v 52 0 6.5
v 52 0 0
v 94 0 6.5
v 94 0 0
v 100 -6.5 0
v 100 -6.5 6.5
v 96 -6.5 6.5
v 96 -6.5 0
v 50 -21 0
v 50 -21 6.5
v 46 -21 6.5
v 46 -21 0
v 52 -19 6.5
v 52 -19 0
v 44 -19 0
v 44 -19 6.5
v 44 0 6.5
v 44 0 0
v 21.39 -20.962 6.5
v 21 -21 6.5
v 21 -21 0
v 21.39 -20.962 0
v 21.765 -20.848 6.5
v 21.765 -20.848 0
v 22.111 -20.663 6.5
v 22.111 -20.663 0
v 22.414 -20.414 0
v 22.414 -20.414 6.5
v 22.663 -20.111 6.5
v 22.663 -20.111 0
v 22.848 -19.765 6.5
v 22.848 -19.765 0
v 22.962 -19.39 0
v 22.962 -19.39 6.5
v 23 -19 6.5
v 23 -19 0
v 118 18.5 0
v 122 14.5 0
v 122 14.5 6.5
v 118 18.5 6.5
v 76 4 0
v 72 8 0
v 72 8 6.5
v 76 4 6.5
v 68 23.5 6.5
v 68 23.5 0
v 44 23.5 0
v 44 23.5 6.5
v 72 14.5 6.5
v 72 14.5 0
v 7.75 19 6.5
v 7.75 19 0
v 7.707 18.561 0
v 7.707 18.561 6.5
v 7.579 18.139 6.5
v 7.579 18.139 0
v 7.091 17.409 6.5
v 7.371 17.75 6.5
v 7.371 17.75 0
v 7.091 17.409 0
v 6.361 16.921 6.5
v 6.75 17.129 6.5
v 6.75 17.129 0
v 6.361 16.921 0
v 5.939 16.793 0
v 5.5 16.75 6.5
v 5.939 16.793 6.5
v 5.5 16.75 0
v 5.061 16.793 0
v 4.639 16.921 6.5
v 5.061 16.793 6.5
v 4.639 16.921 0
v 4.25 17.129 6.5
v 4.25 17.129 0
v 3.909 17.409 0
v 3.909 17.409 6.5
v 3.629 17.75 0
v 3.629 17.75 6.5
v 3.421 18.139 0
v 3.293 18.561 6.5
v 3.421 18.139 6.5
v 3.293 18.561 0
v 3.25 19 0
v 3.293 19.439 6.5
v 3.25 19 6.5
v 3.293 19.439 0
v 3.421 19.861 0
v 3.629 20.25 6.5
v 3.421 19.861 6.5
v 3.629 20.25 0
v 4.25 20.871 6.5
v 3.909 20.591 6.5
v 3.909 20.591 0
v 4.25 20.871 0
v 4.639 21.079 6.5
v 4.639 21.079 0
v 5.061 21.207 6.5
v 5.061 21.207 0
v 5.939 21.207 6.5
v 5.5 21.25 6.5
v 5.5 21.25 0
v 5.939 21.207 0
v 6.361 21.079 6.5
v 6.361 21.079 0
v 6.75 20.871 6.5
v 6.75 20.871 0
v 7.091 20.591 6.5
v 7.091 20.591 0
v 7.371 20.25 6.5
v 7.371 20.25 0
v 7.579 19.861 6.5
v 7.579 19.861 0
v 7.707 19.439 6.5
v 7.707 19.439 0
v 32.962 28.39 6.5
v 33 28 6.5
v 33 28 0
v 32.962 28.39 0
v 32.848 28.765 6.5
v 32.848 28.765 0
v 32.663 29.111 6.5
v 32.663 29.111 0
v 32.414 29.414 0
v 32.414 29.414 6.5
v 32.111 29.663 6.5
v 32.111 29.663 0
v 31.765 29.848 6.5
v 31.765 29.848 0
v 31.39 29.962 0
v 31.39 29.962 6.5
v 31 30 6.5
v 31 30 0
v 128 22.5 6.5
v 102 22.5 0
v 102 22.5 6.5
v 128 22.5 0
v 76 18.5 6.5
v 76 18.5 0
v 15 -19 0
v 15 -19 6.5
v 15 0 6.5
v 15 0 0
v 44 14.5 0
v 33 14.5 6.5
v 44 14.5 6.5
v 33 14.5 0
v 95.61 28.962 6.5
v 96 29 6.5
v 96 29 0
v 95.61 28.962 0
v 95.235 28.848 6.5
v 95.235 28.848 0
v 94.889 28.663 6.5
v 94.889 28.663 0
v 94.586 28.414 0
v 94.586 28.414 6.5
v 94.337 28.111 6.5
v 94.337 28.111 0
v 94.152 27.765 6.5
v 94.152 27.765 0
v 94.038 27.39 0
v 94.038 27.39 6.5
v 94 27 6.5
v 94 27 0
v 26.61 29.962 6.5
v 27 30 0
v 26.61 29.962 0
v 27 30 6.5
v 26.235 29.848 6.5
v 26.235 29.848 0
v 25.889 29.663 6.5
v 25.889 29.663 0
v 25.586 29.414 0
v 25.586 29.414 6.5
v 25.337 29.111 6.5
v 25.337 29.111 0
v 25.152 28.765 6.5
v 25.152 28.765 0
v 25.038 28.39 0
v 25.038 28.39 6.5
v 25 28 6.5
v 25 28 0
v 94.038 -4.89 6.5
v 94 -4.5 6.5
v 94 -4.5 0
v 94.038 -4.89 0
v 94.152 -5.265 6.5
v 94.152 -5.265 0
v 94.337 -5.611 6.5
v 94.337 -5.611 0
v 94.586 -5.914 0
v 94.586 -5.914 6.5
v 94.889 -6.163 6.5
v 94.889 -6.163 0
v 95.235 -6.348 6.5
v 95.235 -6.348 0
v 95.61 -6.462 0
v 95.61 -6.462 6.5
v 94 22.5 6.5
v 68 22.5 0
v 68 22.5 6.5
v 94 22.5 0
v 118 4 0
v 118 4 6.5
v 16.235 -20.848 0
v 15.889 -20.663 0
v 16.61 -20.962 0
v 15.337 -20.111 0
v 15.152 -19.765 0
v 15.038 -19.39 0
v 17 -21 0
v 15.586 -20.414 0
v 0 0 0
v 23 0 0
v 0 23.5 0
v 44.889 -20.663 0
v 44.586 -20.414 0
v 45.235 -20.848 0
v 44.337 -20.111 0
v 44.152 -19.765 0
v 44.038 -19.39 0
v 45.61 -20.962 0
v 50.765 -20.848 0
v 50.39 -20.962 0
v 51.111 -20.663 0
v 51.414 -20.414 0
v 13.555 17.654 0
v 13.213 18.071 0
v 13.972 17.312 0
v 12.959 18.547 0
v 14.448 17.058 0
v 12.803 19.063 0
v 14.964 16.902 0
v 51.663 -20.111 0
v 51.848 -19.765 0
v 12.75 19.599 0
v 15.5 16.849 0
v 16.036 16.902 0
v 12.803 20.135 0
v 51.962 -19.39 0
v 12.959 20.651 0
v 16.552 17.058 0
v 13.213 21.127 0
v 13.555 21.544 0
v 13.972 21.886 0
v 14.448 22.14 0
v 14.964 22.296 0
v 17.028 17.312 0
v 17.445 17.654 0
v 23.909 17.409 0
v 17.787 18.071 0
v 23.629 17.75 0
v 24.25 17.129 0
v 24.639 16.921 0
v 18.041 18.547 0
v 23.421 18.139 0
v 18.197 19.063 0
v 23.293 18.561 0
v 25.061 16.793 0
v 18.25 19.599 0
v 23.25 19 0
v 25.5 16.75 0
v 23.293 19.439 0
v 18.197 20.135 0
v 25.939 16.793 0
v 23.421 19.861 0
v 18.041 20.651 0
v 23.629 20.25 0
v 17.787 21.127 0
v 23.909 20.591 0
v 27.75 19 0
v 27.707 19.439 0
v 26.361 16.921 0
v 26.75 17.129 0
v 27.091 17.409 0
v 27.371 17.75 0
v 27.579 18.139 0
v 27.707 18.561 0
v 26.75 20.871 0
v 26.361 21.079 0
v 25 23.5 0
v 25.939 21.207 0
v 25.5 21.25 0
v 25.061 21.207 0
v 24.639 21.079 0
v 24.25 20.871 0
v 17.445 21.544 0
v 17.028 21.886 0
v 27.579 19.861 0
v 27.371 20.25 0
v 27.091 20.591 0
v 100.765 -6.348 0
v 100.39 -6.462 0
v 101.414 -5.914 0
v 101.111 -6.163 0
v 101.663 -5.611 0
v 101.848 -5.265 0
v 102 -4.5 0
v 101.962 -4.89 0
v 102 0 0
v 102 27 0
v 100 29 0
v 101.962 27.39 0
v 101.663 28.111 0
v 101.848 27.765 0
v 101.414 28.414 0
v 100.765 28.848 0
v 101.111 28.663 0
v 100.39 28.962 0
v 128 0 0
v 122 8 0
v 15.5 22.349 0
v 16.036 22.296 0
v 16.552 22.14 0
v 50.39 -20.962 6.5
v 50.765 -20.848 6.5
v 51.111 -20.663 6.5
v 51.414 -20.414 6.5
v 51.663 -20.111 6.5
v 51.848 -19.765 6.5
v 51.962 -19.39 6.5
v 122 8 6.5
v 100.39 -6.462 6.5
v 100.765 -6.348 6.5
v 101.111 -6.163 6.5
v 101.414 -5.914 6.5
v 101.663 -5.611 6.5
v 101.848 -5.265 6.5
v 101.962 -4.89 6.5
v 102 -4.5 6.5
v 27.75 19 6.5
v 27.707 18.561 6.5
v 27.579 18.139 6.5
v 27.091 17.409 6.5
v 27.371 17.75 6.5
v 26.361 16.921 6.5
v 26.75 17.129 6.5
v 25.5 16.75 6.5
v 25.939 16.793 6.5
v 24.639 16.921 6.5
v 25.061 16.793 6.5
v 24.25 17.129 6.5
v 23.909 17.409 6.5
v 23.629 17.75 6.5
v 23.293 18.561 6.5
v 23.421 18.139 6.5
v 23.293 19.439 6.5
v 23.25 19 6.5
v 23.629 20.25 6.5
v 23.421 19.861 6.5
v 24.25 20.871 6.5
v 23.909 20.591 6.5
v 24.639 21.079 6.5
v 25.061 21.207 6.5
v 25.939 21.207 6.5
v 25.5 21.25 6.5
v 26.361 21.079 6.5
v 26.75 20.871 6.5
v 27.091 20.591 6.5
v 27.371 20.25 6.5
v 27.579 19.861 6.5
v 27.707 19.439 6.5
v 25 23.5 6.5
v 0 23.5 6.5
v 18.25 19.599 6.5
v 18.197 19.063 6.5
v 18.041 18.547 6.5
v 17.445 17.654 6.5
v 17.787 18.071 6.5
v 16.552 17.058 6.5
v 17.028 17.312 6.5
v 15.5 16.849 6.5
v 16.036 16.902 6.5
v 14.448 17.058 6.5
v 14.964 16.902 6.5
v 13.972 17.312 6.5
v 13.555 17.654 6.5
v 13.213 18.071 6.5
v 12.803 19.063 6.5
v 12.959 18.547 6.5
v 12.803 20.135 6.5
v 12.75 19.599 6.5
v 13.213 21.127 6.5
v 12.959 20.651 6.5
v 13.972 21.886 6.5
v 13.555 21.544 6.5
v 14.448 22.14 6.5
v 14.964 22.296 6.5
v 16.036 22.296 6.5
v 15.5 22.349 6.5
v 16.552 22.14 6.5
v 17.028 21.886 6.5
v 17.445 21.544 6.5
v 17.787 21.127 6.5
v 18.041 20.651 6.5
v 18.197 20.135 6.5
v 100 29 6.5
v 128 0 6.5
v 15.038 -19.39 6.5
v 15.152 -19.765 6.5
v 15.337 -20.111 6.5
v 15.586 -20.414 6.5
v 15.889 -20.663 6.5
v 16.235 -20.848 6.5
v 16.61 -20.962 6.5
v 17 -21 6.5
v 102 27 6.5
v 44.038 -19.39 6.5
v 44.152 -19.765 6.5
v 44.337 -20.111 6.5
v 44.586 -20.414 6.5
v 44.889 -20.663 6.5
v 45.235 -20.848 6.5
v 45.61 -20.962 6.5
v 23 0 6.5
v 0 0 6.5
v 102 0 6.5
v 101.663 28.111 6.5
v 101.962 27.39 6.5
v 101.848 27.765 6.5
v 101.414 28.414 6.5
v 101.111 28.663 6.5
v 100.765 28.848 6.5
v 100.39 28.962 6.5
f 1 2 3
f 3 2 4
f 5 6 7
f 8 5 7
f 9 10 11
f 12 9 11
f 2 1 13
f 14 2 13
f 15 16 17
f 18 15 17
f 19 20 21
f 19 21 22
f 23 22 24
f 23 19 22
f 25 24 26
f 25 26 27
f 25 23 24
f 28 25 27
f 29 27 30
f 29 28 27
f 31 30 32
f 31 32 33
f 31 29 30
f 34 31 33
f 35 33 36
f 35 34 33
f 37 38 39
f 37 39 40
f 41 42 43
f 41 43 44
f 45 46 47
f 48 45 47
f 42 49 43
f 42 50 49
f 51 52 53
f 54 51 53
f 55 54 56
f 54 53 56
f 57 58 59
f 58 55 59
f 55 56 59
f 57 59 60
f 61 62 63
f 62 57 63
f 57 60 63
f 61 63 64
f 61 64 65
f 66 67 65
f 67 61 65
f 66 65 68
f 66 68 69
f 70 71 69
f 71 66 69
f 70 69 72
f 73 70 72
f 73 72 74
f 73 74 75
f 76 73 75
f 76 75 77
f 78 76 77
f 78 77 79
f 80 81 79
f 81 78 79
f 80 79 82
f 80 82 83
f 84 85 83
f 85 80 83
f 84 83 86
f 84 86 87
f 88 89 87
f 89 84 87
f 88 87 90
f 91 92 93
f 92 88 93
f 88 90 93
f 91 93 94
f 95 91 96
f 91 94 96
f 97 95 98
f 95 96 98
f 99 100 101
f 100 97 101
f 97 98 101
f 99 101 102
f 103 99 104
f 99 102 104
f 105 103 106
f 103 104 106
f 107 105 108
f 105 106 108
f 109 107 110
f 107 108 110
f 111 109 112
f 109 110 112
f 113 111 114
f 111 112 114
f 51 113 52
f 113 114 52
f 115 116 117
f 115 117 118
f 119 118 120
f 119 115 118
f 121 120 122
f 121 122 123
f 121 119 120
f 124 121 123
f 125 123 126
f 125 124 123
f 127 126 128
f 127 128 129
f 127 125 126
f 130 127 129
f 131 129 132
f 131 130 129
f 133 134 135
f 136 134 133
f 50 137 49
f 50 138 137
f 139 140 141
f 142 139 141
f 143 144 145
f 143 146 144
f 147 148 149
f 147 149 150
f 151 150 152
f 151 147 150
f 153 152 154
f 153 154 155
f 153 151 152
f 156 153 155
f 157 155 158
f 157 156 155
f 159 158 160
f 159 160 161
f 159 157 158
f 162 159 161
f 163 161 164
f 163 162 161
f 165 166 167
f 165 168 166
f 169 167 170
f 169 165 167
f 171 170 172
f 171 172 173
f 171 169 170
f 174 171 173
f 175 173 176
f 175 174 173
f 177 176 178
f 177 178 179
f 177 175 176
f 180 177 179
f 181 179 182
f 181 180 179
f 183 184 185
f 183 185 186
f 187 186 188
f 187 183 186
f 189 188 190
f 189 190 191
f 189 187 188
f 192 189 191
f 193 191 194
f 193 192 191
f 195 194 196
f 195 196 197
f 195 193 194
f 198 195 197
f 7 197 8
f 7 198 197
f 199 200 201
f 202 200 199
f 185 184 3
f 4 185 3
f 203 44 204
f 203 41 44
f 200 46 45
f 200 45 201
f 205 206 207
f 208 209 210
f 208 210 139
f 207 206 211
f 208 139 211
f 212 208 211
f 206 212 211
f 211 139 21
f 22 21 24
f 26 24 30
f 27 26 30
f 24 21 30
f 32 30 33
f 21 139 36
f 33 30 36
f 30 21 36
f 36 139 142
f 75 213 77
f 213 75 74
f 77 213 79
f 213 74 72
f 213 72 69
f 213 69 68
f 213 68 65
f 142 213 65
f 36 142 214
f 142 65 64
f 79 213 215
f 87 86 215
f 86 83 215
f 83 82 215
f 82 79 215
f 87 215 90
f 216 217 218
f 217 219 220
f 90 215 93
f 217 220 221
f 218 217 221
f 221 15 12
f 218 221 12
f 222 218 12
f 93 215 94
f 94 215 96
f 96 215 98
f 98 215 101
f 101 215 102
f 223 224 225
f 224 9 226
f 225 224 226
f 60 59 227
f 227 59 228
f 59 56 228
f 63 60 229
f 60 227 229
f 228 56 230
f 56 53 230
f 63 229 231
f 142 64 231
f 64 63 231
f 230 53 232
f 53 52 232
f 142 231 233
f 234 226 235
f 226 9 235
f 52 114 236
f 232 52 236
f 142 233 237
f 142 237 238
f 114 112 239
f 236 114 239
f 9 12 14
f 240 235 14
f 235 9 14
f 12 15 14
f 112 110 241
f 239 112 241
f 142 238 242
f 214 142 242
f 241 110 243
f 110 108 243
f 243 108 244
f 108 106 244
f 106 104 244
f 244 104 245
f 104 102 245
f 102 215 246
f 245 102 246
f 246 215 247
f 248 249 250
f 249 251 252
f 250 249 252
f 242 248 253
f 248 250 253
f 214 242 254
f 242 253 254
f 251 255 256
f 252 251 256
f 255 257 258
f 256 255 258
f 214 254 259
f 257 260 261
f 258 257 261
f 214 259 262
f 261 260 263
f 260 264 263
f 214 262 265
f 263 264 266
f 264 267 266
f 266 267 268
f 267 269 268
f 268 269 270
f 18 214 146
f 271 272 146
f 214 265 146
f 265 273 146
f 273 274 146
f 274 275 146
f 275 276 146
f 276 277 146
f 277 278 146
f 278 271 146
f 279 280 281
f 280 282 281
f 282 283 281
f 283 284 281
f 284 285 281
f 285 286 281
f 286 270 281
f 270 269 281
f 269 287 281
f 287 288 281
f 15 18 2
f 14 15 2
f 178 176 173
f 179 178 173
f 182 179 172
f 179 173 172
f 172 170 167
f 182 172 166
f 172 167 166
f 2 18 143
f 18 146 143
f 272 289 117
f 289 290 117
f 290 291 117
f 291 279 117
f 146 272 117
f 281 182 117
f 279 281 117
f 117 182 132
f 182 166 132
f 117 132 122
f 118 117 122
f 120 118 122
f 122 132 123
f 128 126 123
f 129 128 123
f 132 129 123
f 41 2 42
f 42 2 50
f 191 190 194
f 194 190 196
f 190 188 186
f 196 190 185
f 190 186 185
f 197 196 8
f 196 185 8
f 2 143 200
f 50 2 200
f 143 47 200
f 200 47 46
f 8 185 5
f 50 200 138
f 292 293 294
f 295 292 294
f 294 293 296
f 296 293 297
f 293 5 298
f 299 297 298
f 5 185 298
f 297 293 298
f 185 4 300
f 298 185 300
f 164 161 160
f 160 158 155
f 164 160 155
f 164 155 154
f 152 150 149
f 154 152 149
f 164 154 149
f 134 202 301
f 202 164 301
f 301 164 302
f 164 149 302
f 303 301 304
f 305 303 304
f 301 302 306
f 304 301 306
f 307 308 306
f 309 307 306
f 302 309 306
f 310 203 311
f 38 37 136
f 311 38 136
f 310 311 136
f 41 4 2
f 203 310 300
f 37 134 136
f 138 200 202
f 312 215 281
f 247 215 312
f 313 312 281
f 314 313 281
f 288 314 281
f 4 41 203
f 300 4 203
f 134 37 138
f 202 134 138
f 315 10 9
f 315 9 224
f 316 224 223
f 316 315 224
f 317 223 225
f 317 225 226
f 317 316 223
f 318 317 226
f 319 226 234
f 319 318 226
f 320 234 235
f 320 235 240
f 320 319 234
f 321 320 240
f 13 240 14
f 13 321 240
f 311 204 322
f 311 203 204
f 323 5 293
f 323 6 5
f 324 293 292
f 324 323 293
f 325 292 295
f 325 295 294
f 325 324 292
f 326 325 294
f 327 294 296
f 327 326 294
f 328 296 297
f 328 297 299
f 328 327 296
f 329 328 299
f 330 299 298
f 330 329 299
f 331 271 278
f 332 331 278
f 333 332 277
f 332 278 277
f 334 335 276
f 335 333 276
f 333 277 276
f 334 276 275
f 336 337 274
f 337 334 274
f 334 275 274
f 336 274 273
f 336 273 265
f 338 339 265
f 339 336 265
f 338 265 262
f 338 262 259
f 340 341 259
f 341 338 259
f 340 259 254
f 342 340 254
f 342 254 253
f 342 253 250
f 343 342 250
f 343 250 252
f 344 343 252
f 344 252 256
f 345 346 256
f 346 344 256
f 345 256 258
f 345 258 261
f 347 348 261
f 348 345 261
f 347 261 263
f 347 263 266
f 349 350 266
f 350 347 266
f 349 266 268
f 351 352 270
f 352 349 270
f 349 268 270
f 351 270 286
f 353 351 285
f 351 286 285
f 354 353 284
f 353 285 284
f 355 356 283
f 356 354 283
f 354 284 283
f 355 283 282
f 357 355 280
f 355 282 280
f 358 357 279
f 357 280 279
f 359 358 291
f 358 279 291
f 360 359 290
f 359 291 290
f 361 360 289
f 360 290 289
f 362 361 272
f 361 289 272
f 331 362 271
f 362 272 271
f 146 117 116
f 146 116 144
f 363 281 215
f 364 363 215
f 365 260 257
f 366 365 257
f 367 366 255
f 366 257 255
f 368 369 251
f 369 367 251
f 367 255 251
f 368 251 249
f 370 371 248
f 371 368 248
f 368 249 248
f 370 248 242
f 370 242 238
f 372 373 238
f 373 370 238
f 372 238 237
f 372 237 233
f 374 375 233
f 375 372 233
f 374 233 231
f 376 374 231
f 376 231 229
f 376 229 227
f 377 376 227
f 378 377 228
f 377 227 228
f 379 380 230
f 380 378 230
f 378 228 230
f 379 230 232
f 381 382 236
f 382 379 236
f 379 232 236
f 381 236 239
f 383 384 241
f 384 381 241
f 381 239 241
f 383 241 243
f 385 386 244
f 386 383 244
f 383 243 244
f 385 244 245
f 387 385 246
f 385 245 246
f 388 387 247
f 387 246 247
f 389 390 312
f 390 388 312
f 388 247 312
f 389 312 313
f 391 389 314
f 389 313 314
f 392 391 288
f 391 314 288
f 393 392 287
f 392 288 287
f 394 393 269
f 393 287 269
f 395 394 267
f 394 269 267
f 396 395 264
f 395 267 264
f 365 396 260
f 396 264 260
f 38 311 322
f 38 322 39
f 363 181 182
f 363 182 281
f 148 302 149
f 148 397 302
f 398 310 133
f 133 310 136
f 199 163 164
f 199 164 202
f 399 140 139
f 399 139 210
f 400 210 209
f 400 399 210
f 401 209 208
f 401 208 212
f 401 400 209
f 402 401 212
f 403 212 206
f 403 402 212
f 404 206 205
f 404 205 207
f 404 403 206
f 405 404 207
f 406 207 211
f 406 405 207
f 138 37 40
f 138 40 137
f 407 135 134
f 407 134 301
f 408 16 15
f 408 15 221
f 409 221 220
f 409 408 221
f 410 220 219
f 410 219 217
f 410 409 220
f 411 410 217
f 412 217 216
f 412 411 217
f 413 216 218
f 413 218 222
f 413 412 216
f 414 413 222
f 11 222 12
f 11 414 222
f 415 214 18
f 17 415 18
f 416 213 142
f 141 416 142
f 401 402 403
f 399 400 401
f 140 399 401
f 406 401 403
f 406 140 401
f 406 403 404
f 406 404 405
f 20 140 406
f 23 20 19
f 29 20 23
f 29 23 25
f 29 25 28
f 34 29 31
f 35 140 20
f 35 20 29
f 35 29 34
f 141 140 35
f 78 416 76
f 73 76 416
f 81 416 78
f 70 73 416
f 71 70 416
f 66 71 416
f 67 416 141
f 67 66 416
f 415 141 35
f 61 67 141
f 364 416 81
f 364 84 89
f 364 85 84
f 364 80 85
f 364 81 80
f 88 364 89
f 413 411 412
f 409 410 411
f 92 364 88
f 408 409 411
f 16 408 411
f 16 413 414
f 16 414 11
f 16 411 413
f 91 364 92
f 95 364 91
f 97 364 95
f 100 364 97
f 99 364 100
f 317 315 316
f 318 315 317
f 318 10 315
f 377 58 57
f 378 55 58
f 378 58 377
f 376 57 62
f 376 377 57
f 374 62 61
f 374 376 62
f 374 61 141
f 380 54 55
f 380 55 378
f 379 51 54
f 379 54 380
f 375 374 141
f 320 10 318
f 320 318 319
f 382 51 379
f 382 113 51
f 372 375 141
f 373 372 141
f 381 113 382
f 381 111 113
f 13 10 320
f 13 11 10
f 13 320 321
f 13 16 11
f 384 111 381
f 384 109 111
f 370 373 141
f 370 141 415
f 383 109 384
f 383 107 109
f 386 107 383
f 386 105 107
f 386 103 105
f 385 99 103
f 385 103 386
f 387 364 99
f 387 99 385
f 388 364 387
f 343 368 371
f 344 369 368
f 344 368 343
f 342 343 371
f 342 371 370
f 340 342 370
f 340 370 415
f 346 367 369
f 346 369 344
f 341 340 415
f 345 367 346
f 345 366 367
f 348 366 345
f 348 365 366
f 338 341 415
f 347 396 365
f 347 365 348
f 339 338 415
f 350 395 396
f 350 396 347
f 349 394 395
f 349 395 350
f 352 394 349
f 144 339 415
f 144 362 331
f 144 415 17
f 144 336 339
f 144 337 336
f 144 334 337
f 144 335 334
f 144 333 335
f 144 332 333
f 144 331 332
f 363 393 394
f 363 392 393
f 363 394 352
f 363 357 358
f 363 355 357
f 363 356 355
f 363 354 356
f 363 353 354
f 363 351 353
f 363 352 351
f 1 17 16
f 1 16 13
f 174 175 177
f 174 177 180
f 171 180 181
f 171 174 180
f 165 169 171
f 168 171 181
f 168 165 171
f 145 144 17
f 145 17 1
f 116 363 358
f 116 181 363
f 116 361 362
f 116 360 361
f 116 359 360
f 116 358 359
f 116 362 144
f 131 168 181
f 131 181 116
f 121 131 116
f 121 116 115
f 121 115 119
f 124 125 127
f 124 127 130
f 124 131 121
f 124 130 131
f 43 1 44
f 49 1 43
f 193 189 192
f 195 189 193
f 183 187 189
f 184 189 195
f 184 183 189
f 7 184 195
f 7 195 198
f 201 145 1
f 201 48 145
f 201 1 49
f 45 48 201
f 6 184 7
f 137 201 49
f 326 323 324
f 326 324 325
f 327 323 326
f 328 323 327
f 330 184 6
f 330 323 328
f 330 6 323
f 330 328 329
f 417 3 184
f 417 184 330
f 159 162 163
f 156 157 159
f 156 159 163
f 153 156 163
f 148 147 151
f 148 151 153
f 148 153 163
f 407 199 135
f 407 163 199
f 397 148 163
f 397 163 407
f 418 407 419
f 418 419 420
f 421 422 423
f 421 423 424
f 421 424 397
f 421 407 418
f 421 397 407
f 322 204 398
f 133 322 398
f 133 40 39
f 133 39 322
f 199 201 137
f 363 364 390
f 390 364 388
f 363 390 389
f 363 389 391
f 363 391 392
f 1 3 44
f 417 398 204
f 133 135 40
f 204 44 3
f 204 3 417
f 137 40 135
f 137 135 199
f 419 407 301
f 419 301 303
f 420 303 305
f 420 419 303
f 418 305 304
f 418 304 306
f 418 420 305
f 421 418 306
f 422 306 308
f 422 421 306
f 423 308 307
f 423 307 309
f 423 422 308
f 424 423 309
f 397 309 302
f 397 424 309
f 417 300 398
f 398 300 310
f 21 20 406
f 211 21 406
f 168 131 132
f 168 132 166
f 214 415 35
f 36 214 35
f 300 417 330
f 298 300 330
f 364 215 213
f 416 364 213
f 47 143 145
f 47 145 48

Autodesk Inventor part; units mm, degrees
ref_plane "YZ Plane" through (0, 0, 0) normal (1, 0, 0) x (0, 1, 0)
ref_plane "XZ Plane" through (0, 0, 0) normal (0, 1, 0) x (-1, 0, 0)
ref_plane "XY Plane" through (0, 0, 0) normal (0, 0, 1) x (1, 0, 0)
sketch "Sketch1" plane through (0, 0, 0) normal (0, 0, 1) x (1, 0, 0)
  line L0 (0, 0) -> (128, 0)
  line L1 (128, 0) -> (128, 22.5)
  line L2 (0, 23.5) -> (0, 0)
  line L3 (68, 23.5) -> (68, 22.5)
  line L4 (68, 22.5) -> (128, 22.5)
  line L5 (33, 23.5) -> (33, 14.5)
  line L6 (33, 14.5) -> (44, 14.5)
  line L7 (44, 14.5) -> (44, 23.5)
  line L8 (68, 23.5) -> (44, 23.5)
  line L9 (33, 23.5) -> (0, 23.5)
  line L10 (72, 14.5) -> (72, 8)
  line L11 (72, 8) -> (76, 4)
  line L12 (76, 4) -> (118, 4)
  line L13 (118, 4) -> (122, 8)
  line L14 (122, 8) -> (122, 14.5)
  line L15 (122, 14.5) -> (118, 18.5)
  line L16 (118, 18.5) -> (76, 18.5)
  line L17 (76, 18.5) -> (72, 14.5)
  line L18 (68, 22.5) -> (68, 0) construction
  circle A0 centre (5.5, 19) radius 2.25
  circle A1 centre (25.5, 19) radius 2.25
  circle A2 centre (15.5, 19.599) radius 2.75
  circle A3 centre (38.5, 19.599) radius 7.5 construction
  circle A4 centre (38.5, 19.599) radius 4 construction
  point P0 (33, 19)
  dimension "d0" = 128
  dimension "d1" = 23.5
  dimension "d2" = 22.5
  dimension "d3" = 60
  dimension "d4" = 11
  dimension "d5" = 9
  dimension "d6" = 33
  dimension "d7" = 45
  dimension "d8" = 4
  dimension "d9" = 4
  dimension "d10" = 6
  dimension "d11" = 4
  dimension "d12" = 4
  dimension "d13" = 4.5
  dimension "d14" = 4.5
  dimension "d15" = 5.5
  dimension "d16" = 20
  dimension "d17" = 5.5
  dimension "d18" = 8
  dimension "d19" = 15
  dimension "d20" = 10
extrude "Extrusion1" add sketch "Sketch1" along normal blind 6.5
sketch "Sketch2" plane through (0, 0, 6.5) normal (0, 0, 1) x (1, 0, 0)
  line L0 (0, 0) -> (128, 0) projected
  line L1 (128, 0) -> (128, 22.5) projected
  line L2 (128, 22.5) -> (68, 22.5) projected
  line L3 (33, 23.5) -> (0, 23.5) projected
  line L4 (0, 23.5) -> (0, 0) projected
  line L5 (25, 23.5) -> (33, 23.5)
  line L6 (33, 23.5) -> (33, 28)
  line L7 (31, 30) -> (27, 30)
  line L8 (25, 28) -> (25, 23.5)
  line L9 (94, 22.5) -> (102, 22.5)
  line L10 (102, 22.5) -> (102, 27)
  line L11 (100, 29) -> (96, 29)
  line L12 (94, 27) -> (94, 22.5)
  line L13 (15, 0) -> (23, 0)
  line L14 (23, 0) -> (23, -19)
  line L15 (21, -21) -> (17, -21)
  line L16 (15, -19) -> (15, 0)
  line L17 (44, 0) -> (52, 0)
  line L18 (52, 0) -> (52, -19)
  line L19 (50, -21) -> (46, -21)
  line L20 (44, -19) -> (44, 0)
  line L21 (94, 0) -> (102, 0)
  line L22 (102, 0) -> (102, -4.5)
  line L23 (100, -6.5) -> (96, -6.5)
  line L24 (94, -4.5) -> (94, 0)
  arc A0 (27, 30) -> (25, 28) centre (27, 28) ccw
  arc A1 (33, 28) -> (31, 30) centre (31, 28) ccw
  arc A2 (96, 29) -> (94, 27) centre (96, 27) ccw
  arc A3 (102, 27) -> (100, 29) centre (100, 27) ccw
  arc A4 (15, -19) -> (17, -21) centre (17, -19) ccw
  arc A5 (21, -21) -> (23, -19) centre (21, -19) ccw
  arc A6 (44, -19) -> (46, -21) centre (46, -19) ccw
  arc A7 (50, -21) -> (52, -19) centre (50, -19) ccw
  arc A8 (94, -4.5) -> (96, -6.5) centre (96, -4.5) ccw
  arc A9 (100, -6.5) -> (102, -4.5) centre (100, -4.5) ccw
  line L25 (33, 14.5) -> (33, 23.5) projected
  dimension "d23" = 2
  dimension "d24" = 8
  dimension "d25" = 8
  dimension "d26" = 8
  dimension "d27" = 8
  dimension "d28" = 8
  dimension "d29" = 21
  dimension "d30" = 6.5
  dimension "d31" = 6.5
  dimension "d33" = 26
  dimension "d34" = 15
  dimension "d35" = 21
  dimension "d38" = 6.5
extrude "Extrusion2" add sketch "Sketch2" against normal blind 6.5
properties part number "x_iddler_upper_nut_stop"
